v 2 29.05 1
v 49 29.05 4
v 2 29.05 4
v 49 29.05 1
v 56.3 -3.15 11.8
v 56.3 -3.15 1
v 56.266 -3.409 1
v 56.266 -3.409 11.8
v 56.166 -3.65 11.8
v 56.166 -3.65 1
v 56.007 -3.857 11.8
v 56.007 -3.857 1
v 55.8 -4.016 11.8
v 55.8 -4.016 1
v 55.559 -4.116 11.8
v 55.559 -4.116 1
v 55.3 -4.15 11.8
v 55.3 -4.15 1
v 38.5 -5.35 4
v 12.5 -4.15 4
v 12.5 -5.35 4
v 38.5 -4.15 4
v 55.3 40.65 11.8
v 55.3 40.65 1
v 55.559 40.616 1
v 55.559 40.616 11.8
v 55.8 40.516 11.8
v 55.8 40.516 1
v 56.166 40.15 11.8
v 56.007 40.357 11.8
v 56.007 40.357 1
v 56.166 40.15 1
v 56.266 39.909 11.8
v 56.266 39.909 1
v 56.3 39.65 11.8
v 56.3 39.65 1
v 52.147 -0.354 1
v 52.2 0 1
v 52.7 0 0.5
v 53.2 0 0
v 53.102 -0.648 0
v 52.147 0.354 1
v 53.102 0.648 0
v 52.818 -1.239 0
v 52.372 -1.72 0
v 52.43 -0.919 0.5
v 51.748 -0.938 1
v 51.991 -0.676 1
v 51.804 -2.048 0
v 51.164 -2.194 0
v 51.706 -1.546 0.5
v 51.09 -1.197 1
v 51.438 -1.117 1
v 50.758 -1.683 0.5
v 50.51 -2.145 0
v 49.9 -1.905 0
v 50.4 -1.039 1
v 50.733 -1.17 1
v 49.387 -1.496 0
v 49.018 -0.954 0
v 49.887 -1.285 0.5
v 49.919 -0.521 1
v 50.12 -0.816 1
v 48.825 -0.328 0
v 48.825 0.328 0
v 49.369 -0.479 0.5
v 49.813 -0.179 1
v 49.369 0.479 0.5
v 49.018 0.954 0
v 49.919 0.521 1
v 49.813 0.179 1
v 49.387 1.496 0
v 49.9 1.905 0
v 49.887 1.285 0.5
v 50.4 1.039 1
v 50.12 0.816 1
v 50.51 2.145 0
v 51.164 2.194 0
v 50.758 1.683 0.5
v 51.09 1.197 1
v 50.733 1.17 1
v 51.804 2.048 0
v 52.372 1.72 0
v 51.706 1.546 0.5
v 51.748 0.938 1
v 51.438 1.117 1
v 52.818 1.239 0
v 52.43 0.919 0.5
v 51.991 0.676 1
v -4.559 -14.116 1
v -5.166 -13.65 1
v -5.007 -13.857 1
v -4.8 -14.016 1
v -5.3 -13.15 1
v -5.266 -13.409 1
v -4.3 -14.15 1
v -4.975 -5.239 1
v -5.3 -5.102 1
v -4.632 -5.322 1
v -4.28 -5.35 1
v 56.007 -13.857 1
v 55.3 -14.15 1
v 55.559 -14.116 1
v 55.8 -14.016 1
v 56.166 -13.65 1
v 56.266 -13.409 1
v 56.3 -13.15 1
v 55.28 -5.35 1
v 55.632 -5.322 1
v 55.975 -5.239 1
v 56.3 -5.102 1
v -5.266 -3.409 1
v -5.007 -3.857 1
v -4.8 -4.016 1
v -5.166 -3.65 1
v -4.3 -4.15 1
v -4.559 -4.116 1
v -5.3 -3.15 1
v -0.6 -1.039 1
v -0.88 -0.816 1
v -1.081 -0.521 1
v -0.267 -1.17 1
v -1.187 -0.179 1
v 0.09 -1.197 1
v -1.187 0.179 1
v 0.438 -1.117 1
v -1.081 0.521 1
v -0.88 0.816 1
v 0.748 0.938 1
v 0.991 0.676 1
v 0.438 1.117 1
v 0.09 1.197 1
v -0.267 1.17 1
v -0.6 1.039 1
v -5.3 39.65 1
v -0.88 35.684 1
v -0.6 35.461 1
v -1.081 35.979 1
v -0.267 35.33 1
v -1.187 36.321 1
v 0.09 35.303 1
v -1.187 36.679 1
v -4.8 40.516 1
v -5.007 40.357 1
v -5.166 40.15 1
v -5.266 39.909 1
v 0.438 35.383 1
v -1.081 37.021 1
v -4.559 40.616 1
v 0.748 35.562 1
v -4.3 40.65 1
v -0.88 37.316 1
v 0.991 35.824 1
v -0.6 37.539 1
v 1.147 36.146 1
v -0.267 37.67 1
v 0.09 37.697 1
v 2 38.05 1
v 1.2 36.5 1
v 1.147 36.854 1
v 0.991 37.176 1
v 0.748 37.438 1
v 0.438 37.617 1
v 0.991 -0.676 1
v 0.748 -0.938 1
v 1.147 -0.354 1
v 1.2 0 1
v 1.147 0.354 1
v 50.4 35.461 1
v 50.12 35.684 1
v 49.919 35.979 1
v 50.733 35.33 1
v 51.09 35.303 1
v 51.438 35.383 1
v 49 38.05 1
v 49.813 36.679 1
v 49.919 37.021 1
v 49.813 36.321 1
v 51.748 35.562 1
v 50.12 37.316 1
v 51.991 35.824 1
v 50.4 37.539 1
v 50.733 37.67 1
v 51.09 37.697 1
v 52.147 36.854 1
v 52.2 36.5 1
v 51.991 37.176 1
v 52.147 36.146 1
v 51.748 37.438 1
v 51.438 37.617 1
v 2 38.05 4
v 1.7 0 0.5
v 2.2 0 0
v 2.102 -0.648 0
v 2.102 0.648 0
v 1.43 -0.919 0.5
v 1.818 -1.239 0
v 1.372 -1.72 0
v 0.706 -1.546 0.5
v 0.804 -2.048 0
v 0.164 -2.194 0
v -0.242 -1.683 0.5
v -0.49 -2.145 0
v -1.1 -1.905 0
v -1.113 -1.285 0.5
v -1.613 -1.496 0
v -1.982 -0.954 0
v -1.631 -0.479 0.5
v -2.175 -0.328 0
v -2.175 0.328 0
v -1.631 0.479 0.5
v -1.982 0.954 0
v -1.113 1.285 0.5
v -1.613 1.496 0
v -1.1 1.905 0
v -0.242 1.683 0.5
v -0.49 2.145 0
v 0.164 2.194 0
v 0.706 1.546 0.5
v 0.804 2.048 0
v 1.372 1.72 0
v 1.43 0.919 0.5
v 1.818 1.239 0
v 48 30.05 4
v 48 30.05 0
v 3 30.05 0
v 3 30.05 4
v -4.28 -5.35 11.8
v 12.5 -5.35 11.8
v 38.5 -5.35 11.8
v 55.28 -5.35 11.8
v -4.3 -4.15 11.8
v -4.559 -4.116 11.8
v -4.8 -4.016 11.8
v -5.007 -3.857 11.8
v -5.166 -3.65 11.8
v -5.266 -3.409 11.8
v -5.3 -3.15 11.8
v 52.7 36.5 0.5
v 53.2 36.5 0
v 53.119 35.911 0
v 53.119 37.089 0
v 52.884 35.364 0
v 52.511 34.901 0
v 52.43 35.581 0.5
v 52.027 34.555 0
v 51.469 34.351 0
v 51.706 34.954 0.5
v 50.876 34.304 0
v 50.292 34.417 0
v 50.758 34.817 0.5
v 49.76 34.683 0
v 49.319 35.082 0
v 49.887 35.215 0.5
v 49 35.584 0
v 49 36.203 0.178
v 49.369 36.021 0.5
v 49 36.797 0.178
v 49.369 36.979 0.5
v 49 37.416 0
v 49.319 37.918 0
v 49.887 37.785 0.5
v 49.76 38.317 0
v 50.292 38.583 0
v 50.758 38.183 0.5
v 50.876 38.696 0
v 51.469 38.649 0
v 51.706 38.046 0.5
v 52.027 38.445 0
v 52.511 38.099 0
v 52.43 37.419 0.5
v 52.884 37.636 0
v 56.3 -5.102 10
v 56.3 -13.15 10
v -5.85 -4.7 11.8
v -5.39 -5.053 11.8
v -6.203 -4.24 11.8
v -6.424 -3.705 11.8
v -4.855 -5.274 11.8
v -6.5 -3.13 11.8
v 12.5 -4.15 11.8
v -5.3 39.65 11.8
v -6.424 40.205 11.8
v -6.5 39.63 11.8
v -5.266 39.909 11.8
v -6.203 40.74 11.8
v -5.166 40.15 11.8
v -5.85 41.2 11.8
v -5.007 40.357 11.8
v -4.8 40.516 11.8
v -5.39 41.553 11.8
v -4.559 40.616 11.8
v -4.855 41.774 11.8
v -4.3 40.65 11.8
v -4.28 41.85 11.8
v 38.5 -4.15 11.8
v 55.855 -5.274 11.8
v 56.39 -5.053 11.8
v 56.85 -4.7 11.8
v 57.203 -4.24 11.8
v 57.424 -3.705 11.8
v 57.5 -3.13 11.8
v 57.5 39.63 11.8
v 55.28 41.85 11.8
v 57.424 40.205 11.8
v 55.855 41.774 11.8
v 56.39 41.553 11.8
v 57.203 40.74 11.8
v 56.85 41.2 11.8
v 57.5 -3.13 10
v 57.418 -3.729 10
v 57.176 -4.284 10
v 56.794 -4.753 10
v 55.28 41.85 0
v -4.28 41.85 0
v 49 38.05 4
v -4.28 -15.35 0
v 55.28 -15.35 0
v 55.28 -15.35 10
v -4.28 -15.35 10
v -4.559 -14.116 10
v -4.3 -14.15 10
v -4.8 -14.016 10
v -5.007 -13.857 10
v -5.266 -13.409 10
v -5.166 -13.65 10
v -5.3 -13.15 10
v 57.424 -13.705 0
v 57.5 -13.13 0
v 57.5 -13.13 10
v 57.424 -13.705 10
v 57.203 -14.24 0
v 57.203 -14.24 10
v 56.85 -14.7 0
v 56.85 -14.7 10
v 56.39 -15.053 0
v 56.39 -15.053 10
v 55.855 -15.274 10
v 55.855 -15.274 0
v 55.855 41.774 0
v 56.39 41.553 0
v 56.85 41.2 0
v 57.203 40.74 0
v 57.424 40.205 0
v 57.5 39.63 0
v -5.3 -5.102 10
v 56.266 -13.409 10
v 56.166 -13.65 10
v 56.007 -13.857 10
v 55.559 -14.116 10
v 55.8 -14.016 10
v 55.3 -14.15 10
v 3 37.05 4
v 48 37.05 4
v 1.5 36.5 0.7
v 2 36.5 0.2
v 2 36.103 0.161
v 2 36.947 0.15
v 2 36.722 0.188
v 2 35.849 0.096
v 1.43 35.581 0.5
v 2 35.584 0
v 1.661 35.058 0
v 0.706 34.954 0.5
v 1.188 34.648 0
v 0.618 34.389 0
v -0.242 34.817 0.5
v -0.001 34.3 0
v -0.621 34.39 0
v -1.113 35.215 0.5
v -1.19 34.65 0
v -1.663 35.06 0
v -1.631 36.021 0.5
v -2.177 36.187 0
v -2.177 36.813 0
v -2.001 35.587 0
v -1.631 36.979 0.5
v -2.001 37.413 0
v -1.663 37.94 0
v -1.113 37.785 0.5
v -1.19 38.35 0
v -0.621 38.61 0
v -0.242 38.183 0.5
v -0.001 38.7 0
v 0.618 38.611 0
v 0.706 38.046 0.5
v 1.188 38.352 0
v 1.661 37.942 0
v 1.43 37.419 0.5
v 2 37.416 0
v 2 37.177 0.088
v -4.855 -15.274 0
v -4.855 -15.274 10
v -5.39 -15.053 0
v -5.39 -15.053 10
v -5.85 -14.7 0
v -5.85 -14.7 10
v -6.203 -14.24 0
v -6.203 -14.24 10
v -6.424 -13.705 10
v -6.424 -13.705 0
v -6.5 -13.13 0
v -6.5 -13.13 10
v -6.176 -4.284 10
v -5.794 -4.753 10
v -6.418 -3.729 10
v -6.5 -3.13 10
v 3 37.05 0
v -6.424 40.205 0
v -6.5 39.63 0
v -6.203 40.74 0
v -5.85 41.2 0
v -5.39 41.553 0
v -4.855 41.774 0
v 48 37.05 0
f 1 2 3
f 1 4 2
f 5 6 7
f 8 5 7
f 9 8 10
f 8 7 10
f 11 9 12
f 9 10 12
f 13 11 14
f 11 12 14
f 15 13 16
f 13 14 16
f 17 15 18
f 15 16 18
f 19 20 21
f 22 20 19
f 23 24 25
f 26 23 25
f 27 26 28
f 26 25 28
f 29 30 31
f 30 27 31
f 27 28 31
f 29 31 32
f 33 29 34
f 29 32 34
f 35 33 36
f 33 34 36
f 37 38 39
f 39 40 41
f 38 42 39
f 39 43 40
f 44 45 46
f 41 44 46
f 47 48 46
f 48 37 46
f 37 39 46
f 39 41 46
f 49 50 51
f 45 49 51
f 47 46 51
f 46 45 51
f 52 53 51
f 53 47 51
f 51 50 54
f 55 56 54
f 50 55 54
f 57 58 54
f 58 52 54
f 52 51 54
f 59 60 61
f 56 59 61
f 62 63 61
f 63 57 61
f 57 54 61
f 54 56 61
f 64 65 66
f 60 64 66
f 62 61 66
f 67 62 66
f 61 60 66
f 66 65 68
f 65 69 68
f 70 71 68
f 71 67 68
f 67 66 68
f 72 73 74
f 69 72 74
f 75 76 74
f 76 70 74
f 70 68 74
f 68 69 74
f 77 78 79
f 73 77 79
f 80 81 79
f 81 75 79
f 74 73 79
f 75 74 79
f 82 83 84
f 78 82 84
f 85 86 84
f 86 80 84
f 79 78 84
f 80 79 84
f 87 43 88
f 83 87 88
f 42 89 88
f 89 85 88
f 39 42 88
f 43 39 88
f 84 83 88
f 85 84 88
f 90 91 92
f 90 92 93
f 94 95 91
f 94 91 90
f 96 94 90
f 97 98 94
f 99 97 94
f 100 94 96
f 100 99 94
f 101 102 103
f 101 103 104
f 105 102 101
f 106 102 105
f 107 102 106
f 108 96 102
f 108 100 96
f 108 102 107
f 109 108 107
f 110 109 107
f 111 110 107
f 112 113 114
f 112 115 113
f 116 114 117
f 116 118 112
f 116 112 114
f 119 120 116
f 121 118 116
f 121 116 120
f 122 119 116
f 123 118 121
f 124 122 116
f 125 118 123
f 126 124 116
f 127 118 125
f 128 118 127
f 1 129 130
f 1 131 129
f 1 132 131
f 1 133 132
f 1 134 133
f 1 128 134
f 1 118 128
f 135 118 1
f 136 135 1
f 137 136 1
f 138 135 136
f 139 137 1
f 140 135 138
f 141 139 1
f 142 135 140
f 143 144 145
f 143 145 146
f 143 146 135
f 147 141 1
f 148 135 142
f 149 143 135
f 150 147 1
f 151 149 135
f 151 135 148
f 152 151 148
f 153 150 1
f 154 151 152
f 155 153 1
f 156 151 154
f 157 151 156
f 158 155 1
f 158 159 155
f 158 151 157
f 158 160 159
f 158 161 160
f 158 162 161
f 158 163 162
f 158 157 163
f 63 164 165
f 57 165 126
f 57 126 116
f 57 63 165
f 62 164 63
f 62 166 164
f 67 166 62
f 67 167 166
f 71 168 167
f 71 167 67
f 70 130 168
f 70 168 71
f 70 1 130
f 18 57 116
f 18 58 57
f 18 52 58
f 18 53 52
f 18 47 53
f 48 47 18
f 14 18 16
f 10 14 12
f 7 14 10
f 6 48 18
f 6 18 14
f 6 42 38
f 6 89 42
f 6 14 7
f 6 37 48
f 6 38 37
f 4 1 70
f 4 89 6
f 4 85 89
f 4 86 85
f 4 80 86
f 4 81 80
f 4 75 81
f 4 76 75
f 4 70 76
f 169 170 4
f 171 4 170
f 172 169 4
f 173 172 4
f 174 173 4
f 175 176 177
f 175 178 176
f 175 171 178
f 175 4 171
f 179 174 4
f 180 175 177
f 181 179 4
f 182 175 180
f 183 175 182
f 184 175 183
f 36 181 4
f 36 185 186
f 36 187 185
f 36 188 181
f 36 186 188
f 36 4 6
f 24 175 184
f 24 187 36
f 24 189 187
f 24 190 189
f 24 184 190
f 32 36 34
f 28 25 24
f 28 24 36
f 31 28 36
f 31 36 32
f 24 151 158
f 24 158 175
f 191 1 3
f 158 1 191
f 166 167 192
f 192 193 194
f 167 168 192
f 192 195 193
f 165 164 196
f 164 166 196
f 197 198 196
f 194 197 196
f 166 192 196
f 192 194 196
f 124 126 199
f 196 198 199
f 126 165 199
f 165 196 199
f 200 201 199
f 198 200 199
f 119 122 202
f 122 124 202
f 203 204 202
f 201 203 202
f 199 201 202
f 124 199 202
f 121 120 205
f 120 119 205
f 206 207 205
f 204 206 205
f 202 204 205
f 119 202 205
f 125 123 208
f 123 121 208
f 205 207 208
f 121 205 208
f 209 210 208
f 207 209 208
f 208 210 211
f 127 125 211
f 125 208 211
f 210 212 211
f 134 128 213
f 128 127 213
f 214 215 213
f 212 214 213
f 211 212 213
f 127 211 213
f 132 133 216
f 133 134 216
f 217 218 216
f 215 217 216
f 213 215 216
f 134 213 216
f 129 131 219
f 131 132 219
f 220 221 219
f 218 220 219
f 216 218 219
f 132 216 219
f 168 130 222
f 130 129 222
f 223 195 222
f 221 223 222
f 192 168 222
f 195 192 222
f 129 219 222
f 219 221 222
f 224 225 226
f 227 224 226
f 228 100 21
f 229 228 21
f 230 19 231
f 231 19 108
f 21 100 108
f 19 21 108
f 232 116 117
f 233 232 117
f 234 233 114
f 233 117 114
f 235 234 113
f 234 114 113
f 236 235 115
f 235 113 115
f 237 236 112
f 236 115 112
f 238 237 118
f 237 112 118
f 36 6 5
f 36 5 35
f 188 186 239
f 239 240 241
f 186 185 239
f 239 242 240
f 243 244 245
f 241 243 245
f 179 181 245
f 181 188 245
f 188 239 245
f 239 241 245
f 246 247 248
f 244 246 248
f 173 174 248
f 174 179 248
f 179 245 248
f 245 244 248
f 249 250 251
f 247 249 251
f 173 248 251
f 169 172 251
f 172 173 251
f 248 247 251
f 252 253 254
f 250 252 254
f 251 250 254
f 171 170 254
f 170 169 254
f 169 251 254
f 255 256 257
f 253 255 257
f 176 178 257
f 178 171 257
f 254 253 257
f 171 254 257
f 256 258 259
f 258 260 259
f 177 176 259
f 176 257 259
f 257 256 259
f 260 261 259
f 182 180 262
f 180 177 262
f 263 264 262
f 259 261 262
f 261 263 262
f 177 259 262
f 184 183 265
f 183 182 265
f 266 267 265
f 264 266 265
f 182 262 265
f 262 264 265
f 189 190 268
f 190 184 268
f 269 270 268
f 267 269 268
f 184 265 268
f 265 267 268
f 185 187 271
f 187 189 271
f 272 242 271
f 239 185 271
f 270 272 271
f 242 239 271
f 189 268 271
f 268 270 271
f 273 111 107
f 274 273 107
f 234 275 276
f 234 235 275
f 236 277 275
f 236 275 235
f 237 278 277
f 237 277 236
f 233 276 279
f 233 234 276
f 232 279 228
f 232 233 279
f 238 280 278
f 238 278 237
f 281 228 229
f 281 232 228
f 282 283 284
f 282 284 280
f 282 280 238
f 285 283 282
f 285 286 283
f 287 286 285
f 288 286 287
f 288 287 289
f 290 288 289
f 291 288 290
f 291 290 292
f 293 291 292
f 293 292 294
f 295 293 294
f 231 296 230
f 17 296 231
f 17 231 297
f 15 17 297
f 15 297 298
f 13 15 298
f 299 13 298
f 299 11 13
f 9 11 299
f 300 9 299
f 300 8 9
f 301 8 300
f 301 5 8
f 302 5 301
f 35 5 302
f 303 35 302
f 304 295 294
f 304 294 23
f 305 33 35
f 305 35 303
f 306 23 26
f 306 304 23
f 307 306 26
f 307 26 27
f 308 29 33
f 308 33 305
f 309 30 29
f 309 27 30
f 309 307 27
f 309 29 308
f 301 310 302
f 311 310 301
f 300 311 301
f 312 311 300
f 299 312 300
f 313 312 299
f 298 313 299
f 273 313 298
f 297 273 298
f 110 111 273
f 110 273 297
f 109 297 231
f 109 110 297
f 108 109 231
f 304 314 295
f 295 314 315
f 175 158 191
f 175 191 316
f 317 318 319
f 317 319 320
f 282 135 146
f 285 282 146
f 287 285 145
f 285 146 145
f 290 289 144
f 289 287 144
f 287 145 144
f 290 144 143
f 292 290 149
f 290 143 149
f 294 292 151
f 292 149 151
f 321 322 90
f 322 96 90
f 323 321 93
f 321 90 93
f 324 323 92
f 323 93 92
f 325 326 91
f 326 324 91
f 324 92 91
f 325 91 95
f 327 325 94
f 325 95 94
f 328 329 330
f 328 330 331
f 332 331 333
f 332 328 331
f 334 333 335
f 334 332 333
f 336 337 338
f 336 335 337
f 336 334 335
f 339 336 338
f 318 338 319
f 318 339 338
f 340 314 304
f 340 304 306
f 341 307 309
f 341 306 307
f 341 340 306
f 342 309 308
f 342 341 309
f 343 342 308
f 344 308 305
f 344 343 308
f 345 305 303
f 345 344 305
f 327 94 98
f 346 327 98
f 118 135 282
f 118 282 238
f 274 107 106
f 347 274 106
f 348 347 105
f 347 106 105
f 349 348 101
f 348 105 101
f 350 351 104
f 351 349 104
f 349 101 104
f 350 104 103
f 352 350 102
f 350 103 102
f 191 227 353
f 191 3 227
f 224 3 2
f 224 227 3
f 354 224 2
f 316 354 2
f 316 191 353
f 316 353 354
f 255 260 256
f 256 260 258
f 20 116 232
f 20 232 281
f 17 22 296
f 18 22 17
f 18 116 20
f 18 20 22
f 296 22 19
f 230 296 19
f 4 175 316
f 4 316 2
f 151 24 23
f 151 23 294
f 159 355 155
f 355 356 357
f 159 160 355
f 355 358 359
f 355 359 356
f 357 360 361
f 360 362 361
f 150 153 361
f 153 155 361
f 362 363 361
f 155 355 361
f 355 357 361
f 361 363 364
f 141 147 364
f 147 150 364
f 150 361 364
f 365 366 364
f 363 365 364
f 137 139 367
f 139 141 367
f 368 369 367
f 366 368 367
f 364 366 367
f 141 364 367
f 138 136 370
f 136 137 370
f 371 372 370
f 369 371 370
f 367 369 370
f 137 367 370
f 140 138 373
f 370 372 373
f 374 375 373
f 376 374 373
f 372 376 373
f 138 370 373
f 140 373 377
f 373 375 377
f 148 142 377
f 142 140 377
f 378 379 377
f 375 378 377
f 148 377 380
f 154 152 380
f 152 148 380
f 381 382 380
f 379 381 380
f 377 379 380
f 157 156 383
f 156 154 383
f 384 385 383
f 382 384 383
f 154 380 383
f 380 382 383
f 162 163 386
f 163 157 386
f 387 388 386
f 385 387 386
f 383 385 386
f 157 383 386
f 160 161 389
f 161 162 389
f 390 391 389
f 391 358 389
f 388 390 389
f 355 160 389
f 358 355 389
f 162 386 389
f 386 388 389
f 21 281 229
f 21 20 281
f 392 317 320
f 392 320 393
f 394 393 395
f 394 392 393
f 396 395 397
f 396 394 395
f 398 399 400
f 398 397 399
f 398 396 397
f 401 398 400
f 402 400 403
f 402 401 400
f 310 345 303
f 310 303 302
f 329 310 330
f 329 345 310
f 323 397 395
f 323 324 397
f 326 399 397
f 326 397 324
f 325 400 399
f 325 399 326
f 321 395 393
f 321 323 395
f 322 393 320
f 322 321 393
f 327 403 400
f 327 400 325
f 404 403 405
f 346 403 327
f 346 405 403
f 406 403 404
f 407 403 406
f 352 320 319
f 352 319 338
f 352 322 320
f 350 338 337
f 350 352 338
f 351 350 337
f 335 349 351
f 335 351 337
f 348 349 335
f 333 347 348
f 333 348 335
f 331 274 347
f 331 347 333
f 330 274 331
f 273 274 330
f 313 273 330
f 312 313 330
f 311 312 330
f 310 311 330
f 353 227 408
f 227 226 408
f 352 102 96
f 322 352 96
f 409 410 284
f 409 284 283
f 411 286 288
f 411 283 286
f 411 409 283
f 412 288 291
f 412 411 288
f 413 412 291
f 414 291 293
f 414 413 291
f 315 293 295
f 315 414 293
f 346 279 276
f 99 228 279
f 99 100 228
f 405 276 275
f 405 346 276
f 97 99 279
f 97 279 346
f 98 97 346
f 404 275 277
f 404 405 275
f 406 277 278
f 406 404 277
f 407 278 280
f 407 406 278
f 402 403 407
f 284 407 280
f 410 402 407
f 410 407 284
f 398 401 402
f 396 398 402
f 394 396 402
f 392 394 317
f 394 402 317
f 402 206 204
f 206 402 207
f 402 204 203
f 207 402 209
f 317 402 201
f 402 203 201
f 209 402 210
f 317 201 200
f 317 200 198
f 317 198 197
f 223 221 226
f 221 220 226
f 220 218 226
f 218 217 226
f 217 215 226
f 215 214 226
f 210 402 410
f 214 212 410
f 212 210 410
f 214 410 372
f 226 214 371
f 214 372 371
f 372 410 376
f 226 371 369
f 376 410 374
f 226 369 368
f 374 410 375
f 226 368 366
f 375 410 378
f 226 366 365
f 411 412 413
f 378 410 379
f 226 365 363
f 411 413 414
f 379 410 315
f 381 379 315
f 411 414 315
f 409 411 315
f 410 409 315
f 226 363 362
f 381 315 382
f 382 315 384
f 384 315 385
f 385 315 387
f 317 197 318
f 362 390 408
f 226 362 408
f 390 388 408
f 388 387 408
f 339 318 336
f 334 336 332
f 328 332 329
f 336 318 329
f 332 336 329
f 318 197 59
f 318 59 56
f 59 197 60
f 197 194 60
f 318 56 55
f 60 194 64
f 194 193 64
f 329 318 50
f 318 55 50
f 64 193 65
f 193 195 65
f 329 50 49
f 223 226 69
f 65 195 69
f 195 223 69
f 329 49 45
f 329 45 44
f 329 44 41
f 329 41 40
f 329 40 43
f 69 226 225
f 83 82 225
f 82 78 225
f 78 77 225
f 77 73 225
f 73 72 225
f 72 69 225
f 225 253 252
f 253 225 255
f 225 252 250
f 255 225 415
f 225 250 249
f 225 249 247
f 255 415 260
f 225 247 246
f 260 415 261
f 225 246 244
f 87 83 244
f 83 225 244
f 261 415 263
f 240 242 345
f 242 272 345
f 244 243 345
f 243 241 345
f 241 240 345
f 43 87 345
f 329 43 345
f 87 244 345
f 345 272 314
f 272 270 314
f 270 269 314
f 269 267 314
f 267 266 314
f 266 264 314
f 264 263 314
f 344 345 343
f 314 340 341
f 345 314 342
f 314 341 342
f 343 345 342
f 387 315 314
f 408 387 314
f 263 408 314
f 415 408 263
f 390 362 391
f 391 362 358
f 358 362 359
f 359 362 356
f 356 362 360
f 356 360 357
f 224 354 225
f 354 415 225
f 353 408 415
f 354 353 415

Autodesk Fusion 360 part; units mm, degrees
sketch "Esquisse1" plane through (0, 0, 0) normal (0, 0, 1) x (1, 0, 0)
  line L0 (0, 0) -> (51, 0) construction
  line L1 (51, 0) -> (51, 36.5) construction
  line L2 (51, 36.5) -> (0, 36.5) construction
  line L3 (0, 36.5) -> (0, 0) construction
  circle A0 centre (0, 36.5) radius 1.2
  circle A1 centre (51, 36.5) radius 1.2
  circle A2 centre (0, 0) radius 1.2
  circle A3 centre (51, 0) radius 1.2
  line L4 (0, 18.25) -> (51, 18.25) construction
  line L5 (25.5, 36.5) -> (25.5, 0) construction
  line L6 (55.28, 41.85) -> (-4.28, 41.85)
  line L7 (-6.5, 39.63) -> (-6.5, -3.13)
  line L8 (-4.28, -5.35) -> (55.28, -5.35)
  line L9 (57.5, -3.13) -> (57.5, 39.63)
  line L10 (57.5, 41.85) -> (-6.5, -5.35) construction
  line L11 (-6.5, 41.85) -> (57.5, -5.35) construction
  line L12 (50.325, 36.86) -> (0.675, -0.36) construction
  line L13 (0.675, 36.86) -> (50.325, -0.36) construction
  line L14 (-5.3, 39.65) -> (-5.3, -3.15)
  line L15 (-4.3, -4.15) -> (55.3, -4.15)
  line L16 (56.3, -3.15) -> (56.3, 39.65)
  line L17 (55.3, 40.65) -> (-4.3, 40.65)
  arc A4 (-4.3, 40.65) -> (-5.3, 39.65) centre (-4.3, 39.65) ccw
  arc A5 (56.3, 39.65) -> (55.3, 40.65) centre (55.3, 39.65) ccw
  arc A6 (55.3, -4.15) -> (56.3, -3.15) centre (55.3, -3.15) ccw
  arc A7 (-5.3, -3.15) -> (-4.3, -4.15) centre (-4.3, -3.15) ccw
  arc A8 (57.5, 39.63) -> (55.28, 41.85) centre (55.28, 39.63) ccw
  arc A9 (-4.28, 41.85) -> (-6.5, 39.63) centre (-4.28, 39.63) ccw
  arc A10 (-6.5, -3.13) -> (-4.28, -5.35) centre (-4.28, -3.13) ccw
  arc A11 (55.28, -5.35) -> (57.5, -3.13) centre (55.28, -3.13) ccw
  line L18 (3, 37.05) -> (48, 37.05)
  line L19 (48, 37.05) -> (48, 30.05)
  line L20 (48, 30.05) -> (3, 30.05)
  line L21 (3, 30.05) -> (3, 37.05)
  line L22 (2, 38.05) -> (49, 38.05)
  line L23 (49, 38.05) -> (49, 29.05)
  line L24 (49, 29.05) -> (2, 29.05)
  line L25 (2, 29.05) -> (2, 38.05)
  line L26 (12.5, -4.15) -> (12.5, -5.35)
  line L27 (38.5, -4.15) -> (38.5, -5.35)
  line L28 (57.5, -3.13) -> (57.5, -13.13)
  line L29 (55.28, -15.35) -> (-4.28, -15.35)
  line L30 (-6.5, -13.13) -> (-6.5, -3.13)
  line L31 (56.3, -3.13) -> (56.3, -13.15)
  line L32 (55.3, -14.15) -> (-4.3, -14.15)
  line L33 (-5.3, -13.15) -> (-5.3, -3.13)
  arc A12 (-5.3, -13.15) -> (-4.3, -14.15) centre (-4.3, -13.15) ccw
  arc A13 (55.3, -14.15) -> (56.3, -13.15) centre (55.3, -13.15) ccw
  arc A14 (55.28, -15.35) -> (57.5, -13.13) centre (55.28, -13.13) ccw
  arc A15 (-6.5, -13.13) -> (-4.28, -15.35) centre (-4.28, -13.13) ccw
  point P0 (25.5, 18.25)
  point P1 (25.5, 18.25)
  dimension "d1" = 51
  dimension "d2" = 36.5
  dimension "d3" = 2.4
  dimension "d4" = 2.4
  dimension "d5" = 2.4
  dimension "d6" = 2.4
  dimension "d7" = 64
  dimension "d8" = 47.2
  dimension "d9" = 49.65
  dimension "d10" = 37.22
  dimension "d16" = 1
  dimension "d17" = 2.22
  dimension "d21" = 9.5
  dimension "d22" = 9.5
  dimension "d23" = 4.8
  dimension "d24" = 11.8
  dimension "d25" = -1
  dimension "d28" = 13
  dimension "d29" = 10
  dimension "d31" = 1
  dimension "d32" = 2.22
extrude "Extrusion1" add sketch "Esquisse1" along normal blind 1 contours L8 A10 A11 L31 L32 L33 A12 A13 | L8 L15 A6 A11 L27 L31 | L8 L15 A7 A10 L26 L33 | L14 L15 L16 L17 A4 A5 A6 A7 L31 L33 | L8 L15 L26 L27 | L22 L23 L24 L25
extrude "Extrusion2" add sketch "Esquisse1" along normal blind 11.8 contours L6 L7 L9 L14 L16 L17 A4 A5 A8 A9 A10 A11 L31 L33 | L8 L15 A6 A11 L27 L31 | L8 L15 A7 A10 L26 L33
chamfer "Chanfrein1" distance 1 angle 45 4 edges at (-1.1188, 0.4339, 0) (49.8812, 0.4339, 0) (49.8812, 36.9339, 0) (-1.1188, 36.9339, 0)
extrude "Extrusion3" add sketch "Esquisse1" along normal blind 4 contours L8 L15 L26 L27 | L22 L23 L24 L25
extrude "Extrusion4" add sketch "Esquisse1" along normal blind 10 contours A10 A11 L28 L29 L30 L31 L32 L33 A12 A13 A14 A15
equation "d4 = d3"
equation "d5 = d3"
equation "d6 = d3"
